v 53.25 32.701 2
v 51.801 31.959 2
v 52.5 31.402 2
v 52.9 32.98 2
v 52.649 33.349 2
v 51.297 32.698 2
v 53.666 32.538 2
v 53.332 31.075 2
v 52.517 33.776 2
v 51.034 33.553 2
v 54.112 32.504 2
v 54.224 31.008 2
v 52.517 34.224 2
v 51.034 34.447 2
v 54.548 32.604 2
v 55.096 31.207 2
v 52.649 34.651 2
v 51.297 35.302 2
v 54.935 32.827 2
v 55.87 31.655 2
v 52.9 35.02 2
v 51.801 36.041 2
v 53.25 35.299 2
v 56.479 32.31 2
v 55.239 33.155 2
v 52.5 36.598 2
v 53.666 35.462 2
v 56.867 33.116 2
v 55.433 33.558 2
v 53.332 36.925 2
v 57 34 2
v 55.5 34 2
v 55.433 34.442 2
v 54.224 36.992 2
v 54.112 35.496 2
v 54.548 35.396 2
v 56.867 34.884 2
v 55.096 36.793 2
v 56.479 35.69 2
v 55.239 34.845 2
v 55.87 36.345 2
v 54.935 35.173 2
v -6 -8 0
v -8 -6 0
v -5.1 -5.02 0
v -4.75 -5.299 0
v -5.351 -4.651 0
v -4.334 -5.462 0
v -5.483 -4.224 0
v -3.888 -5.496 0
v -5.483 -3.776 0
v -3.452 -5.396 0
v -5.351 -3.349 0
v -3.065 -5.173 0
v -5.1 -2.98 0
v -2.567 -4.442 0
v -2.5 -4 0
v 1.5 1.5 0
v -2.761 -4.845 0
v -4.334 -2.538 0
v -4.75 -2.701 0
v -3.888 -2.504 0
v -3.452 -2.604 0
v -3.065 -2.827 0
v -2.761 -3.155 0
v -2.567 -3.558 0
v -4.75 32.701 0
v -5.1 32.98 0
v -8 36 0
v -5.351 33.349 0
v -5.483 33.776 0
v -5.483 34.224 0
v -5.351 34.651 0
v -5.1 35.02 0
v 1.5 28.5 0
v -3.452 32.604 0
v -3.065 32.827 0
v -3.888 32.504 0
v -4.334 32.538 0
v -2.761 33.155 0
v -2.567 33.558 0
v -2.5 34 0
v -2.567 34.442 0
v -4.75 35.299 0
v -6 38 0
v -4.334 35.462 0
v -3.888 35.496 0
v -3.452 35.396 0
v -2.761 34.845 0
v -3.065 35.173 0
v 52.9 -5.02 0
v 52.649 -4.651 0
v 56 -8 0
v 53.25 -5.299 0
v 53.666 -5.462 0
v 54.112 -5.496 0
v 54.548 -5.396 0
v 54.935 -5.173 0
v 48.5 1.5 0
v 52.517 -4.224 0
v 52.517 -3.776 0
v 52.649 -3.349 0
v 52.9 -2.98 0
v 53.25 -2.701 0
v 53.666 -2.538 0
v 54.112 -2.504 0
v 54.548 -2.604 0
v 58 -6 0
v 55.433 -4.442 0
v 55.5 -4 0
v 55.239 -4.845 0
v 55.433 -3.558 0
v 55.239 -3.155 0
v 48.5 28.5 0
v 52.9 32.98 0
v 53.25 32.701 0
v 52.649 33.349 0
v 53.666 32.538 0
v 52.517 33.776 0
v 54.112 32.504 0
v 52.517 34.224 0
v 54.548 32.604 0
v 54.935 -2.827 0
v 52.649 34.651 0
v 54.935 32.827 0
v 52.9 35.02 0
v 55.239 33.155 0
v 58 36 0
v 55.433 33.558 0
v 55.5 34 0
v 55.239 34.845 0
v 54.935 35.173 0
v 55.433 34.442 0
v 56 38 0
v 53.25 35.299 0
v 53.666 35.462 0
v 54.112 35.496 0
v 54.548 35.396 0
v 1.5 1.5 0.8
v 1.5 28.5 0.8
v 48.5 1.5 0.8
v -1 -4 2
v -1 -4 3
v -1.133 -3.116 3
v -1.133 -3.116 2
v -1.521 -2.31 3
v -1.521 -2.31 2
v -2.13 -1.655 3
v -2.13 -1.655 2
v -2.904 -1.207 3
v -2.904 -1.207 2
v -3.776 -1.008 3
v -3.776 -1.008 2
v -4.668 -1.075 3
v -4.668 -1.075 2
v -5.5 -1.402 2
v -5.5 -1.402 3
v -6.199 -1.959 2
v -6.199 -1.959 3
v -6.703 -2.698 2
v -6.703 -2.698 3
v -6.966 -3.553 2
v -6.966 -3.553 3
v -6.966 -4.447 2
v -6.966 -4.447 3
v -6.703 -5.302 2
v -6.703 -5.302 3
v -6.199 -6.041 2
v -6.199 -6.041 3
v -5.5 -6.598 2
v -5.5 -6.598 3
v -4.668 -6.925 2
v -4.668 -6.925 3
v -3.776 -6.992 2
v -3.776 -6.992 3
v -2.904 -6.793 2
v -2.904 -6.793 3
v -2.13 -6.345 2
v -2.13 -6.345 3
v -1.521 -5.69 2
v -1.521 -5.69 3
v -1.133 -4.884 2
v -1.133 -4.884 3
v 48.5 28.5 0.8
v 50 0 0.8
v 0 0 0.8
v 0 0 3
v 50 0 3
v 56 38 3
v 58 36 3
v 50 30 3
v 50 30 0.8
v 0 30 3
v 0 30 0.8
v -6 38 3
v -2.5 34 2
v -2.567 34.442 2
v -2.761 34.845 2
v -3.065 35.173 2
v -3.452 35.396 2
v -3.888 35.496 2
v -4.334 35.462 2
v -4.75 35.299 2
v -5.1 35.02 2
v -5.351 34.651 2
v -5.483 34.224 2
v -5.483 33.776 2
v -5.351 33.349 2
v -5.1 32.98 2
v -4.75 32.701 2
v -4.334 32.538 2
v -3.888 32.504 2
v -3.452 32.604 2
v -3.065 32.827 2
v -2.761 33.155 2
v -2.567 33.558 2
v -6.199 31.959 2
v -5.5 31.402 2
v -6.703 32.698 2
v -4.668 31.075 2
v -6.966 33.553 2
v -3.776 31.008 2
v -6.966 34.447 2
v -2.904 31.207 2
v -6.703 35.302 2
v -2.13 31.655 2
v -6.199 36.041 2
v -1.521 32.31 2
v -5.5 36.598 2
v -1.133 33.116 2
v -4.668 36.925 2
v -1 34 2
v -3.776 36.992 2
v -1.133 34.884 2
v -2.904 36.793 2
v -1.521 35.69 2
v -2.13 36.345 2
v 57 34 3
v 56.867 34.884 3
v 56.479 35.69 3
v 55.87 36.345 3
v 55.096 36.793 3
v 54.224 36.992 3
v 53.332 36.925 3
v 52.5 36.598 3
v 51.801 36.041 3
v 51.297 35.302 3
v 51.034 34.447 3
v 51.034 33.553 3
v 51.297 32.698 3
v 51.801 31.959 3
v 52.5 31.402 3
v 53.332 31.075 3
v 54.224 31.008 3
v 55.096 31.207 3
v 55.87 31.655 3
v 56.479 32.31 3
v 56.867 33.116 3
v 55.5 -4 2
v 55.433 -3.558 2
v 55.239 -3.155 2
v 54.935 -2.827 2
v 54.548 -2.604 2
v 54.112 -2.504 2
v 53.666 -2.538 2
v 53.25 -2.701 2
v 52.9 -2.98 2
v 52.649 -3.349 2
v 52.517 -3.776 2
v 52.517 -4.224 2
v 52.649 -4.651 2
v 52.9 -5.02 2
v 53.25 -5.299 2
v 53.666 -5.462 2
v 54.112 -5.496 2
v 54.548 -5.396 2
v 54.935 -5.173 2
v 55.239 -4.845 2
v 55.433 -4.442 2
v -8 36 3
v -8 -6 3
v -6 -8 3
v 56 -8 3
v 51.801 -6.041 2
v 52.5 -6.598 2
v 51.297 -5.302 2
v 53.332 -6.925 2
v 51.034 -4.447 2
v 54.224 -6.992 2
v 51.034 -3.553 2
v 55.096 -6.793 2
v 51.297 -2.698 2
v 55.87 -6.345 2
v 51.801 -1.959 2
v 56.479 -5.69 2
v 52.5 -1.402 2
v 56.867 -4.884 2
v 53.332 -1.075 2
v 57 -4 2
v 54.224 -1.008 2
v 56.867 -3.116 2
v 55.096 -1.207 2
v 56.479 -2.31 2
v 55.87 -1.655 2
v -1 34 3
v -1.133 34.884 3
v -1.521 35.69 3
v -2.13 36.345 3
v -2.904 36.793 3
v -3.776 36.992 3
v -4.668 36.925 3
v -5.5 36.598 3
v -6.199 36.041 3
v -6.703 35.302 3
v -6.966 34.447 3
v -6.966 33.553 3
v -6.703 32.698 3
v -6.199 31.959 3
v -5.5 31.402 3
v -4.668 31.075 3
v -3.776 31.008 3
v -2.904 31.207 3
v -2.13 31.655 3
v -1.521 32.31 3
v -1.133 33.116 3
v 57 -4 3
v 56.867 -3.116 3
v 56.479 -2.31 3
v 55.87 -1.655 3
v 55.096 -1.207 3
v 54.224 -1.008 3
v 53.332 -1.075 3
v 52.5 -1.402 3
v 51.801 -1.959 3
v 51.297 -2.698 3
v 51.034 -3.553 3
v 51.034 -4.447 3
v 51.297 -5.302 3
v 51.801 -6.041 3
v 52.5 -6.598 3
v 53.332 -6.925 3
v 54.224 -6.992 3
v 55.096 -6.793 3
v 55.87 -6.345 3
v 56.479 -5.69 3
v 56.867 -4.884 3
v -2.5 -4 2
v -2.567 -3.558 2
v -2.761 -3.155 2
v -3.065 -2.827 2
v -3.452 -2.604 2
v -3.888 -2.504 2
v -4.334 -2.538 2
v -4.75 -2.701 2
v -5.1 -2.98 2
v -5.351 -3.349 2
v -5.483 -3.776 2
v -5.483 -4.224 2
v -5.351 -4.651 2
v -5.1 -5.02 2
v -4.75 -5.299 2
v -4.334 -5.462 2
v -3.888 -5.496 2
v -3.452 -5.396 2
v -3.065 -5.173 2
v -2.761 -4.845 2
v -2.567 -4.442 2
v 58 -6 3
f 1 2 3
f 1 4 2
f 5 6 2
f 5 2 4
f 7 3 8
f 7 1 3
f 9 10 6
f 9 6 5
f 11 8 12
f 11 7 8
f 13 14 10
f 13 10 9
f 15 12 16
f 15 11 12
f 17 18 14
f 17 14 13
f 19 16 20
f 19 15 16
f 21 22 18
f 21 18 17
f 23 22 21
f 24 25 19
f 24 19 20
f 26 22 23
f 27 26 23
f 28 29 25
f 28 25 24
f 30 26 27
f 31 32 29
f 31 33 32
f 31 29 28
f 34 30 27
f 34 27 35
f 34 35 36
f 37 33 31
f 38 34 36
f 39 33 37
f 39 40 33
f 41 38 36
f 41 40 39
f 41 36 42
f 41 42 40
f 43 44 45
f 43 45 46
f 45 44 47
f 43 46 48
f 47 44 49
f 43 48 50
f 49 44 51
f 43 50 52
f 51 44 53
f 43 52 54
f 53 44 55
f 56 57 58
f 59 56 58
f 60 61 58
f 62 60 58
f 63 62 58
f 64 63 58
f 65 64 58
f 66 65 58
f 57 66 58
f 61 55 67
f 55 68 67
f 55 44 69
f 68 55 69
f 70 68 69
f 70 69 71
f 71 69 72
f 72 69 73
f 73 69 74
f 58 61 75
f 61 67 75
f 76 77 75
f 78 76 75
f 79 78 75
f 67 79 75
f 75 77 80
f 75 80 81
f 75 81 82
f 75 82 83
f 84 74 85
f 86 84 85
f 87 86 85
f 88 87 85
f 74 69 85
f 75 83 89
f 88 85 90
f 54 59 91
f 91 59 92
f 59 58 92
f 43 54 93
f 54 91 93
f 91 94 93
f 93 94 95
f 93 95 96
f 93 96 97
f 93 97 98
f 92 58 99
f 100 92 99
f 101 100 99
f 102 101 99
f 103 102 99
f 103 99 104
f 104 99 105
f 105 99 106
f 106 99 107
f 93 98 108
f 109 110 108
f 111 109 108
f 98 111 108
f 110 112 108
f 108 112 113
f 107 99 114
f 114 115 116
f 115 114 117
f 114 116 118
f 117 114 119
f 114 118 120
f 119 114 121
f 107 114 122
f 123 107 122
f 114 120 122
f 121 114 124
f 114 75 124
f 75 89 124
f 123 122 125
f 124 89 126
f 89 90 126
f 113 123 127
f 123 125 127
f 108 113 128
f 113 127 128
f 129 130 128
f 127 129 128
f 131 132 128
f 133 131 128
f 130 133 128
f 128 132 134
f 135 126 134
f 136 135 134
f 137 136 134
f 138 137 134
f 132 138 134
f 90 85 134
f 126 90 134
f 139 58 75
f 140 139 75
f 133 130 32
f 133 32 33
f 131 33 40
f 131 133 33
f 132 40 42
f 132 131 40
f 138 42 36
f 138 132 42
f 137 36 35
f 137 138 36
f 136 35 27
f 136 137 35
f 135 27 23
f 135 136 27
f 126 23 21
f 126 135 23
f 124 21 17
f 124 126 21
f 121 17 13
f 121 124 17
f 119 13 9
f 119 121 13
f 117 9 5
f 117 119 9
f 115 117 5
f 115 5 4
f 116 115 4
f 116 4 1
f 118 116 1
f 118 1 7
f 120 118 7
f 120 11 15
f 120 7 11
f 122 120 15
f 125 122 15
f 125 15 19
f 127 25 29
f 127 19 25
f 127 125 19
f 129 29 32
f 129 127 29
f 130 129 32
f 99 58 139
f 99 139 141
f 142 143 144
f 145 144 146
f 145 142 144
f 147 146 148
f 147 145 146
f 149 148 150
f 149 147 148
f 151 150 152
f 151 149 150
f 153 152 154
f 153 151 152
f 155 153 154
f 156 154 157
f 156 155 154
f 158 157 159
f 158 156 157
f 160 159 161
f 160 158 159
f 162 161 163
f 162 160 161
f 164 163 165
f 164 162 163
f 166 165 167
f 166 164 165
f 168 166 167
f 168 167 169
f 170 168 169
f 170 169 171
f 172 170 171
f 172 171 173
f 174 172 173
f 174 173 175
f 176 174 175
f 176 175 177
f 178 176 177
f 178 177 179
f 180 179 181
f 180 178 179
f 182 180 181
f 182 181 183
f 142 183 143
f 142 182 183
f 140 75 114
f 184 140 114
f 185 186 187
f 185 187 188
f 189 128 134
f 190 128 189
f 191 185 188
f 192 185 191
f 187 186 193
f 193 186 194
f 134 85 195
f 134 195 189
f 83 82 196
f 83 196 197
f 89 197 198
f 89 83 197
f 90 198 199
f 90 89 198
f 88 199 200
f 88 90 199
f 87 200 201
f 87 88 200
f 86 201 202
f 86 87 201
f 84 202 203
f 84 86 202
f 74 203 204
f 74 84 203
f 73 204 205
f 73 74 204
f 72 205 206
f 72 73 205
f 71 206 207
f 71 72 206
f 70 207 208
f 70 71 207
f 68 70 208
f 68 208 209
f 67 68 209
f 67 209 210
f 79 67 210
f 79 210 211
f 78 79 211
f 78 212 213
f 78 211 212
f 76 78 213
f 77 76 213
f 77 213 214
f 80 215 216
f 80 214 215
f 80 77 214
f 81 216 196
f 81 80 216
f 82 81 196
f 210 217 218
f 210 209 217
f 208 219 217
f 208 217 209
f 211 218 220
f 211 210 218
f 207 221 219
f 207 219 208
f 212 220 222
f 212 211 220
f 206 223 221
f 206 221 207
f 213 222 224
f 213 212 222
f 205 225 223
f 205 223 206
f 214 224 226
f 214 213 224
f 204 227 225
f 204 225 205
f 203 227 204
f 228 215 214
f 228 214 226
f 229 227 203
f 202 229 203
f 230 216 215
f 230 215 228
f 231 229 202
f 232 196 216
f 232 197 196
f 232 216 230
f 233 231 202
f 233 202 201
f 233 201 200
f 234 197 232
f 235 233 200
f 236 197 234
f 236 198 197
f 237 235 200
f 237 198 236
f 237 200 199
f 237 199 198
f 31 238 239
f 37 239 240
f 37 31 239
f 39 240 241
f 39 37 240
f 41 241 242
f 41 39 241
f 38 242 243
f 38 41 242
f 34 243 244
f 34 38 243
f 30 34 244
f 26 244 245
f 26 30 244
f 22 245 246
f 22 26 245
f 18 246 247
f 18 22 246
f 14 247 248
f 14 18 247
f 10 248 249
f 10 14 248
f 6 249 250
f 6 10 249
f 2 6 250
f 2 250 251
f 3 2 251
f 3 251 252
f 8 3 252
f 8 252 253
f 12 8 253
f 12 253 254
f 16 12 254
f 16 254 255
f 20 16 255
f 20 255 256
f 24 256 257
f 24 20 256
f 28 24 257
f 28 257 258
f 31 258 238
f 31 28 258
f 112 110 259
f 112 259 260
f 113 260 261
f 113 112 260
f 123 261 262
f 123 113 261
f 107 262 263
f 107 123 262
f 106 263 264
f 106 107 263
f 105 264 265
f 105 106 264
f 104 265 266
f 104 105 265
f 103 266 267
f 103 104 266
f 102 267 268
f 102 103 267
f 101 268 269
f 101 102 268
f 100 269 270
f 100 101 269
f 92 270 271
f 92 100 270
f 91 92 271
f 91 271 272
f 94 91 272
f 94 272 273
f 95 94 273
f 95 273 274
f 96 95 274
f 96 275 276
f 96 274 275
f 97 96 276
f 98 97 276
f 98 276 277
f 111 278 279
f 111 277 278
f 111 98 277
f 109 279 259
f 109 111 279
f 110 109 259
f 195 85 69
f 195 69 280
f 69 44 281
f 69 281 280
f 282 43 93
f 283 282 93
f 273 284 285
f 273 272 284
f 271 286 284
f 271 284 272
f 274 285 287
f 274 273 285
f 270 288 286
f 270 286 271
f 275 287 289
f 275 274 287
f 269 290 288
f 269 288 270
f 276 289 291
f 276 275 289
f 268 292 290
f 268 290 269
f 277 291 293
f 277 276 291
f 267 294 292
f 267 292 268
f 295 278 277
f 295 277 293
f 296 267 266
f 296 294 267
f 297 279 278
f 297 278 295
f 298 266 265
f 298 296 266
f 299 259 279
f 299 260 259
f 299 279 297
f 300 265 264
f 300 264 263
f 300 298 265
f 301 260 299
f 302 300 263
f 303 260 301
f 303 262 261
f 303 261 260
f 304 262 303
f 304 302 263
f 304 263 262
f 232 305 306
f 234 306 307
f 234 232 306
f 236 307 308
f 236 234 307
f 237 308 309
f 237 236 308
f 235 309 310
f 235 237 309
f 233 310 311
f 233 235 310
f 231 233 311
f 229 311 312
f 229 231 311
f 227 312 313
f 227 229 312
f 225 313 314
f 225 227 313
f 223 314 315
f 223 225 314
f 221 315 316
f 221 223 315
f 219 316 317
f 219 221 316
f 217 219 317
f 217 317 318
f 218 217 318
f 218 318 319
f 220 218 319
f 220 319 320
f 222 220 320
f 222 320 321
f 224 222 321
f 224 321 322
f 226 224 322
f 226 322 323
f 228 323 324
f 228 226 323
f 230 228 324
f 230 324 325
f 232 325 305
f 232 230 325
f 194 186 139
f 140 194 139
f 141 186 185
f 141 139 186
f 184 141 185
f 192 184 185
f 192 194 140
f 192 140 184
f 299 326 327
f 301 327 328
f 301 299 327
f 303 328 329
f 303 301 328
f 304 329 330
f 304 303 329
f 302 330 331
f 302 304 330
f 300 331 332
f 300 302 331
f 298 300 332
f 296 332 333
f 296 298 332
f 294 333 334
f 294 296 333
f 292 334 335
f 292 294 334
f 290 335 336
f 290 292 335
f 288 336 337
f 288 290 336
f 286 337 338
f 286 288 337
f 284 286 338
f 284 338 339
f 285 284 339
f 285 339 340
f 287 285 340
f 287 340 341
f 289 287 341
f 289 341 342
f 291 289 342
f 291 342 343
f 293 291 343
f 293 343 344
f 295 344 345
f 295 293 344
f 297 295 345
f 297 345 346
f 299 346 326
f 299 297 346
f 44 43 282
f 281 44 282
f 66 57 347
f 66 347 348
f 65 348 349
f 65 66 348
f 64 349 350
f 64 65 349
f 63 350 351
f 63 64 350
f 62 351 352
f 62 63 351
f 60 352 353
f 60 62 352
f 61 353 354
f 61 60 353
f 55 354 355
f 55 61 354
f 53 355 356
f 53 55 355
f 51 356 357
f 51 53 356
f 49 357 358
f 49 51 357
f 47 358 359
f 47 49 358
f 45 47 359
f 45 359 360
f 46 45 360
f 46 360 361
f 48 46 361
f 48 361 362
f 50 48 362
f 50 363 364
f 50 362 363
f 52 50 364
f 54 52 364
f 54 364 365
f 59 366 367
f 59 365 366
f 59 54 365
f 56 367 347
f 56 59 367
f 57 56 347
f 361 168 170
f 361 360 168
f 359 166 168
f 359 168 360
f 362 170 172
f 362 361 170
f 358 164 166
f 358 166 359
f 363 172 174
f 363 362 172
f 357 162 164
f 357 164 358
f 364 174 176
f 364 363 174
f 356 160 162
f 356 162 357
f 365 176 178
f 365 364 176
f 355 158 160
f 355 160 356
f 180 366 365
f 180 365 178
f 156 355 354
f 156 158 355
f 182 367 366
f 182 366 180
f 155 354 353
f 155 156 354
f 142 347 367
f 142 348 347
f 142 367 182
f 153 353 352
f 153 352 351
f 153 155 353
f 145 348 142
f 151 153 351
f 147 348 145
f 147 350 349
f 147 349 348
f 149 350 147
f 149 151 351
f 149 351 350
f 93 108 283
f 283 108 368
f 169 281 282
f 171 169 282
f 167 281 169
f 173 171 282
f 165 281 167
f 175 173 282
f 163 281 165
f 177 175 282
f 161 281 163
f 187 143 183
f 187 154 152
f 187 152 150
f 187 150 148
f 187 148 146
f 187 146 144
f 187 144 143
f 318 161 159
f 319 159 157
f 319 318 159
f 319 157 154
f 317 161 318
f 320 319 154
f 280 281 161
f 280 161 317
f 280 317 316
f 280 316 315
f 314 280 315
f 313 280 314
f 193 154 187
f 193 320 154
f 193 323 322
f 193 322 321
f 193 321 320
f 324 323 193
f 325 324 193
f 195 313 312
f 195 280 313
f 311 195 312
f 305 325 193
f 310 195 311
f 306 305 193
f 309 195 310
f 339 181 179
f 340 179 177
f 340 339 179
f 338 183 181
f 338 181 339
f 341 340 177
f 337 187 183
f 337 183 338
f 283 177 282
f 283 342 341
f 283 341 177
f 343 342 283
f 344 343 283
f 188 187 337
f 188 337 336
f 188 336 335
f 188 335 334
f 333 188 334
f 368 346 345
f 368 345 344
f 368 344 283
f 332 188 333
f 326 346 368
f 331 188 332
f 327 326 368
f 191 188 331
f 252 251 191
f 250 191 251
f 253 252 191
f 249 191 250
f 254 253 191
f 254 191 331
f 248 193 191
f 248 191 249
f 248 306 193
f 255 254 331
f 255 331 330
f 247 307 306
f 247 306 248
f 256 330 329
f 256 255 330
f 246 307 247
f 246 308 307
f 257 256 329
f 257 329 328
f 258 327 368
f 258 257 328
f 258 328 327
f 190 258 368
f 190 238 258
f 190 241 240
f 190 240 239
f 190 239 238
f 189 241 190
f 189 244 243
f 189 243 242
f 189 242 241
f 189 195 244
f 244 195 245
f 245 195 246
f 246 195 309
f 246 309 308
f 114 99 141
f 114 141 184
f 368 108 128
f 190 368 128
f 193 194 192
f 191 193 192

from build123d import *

# Parameters (mm, degrees)
CYLINDER007_R     = 3
CYLINDER007_DEPTH = 3
CYLINDER006_R     = 3
CYLINDER006_DEPTH = 3
CYLINDER004_R     = 3
CYLINDER004_DEPTH = 3
CYLINDER005_R     = 3
CYLINDER005_DEPTH = 3
CYLINDER001_R     = 1.5
CYLINDER001_DEPTH = 10
CYLINDER002_R     = 1.5
CYLINDER002_DEPTH = 10
CYLINDER003_R     = 1.5
CYLINDER003_DEPTH = 10
CYLINDER_R        = 1.5
CYLINDER_DEPTH    = 10
BOX_W             = 50
BOX_H             = 30
BOX_DEPTH         = 3
BOX002_W          = 47
BOX002_H          = 27
BOX002_DEPTH      = 6
BOX001_W          = 66
BOX001_H          = 46
BOX001_DEPTH      = 3
CHAMFER_SIZE      = 2
CHAMFER001_SIZE   = 2


with BuildPart() as v_lec007:
    # Cylinder007 → Cylinder007 (new body)
    with BuildSketch(Plane(origin=(54, -4, -2), x_dir=(1, 0, 0), z_dir=(0, 0, 1))):
        Circle(CYLINDER007_R)
    extrude(amount=CYLINDER007_DEPTH)


with BuildPart() as v_lec006:
    # Cylinder006 → Cylinder006 (new body)
    with BuildSketch(Plane(origin=(54, 34, -2), x_dir=(1, 0, 0), z_dir=(0, 0, 1))):
        Circle(CYLINDER006_R)
    extrude(amount=CYLINDER006_DEPTH)


with BuildPart() as v_lec004:
    # Cylinder004 → Cylinder004 (new body)
    with BuildSketch(Plane(origin=(-4, -4, -2), x_dir=(1, 0, 0), z_dir=(0, 0, 1))):
        Circle(CYLINDER004_R)
    extrude(amount=CYLINDER004_DEPTH)


with BuildPart() as compound001:
    # Cylinder005 → Cylinder005 (new body)
    with BuildSketch(Plane(origin=(-4, 34, -2), x_dir=(1, 0, 0), z_dir=(0, 0, 1))):
        Circle(CYLINDER005_R)
    extrude(amount=CYLINDER005_DEPTH)

    # Compound001: union Válec007, Válec006, Válec004
    add(v_lec007.part)
    add(v_lec006.part)
    add(v_lec004.part)


with BuildPart() as compound001_1:
    # Compound001 placement: moved
    add(compound001.part.moved(Location((0, 0, 4))))


with BuildPart() as v_lec001:
    # Cylinder001 → Cylinder001 (new body)
    with BuildSketch(Plane(origin=(54, -4, -2), x_dir=(1, 0, 0), z_dir=(0, 0, 1))):
        Circle(CYLINDER001_R)
    extrude(amount=CYLINDER001_DEPTH)


with BuildPart() as v_lec002:
    # Cylinder002 → Cylinder002 (new body)
    with BuildSketch(Plane(origin=(54, 34, -2), x_dir=(1, 0, 0), z_dir=(0, 0, 1))):
        Circle(CYLINDER002_R)
    extrude(amount=CYLINDER002_DEPTH)


with BuildPart() as v_lec003:
    # Cylinder003 → Cylinder003 (new body)
    with BuildSketch(Plane(origin=(-4, -4, -2), x_dir=(1, 0, 0), z_dir=(0, 0, 1))):
        Circle(CYLINDER003_R)
    extrude(amount=CYLINDER003_DEPTH)


with BuildPart() as compound:
    # Cylinder → Cylinder (new body)
    with BuildSketch(Plane(origin=(-4, 34, -2), x_dir=(1, 0, 0), z_dir=(0, 0, 1))):
        Circle(CYLINDER_R)
    extrude(amount=CYLINDER_DEPTH)

    # Compound: union Válec001, Válec002, Válec003
    add(v_lec001.part)
    add(v_lec002.part)
    add(v_lec003.part)


with BuildPart() as krychle:
    # Box → Box (new body)
    with BuildSketch(Plane.XY.offset(0.8)):
        with Locations((25, 15)):
            Rectangle(BOX_W, BOX_H)
    extrude(amount=BOX_DEPTH)


with BuildPart() as krychle002:
    # Box002 → Box002 (new body)
    with BuildSketch(Plane(origin=(1.5, 1.5, -1), x_dir=(1, 0, 0), z_dir=(0, 0, 1))):
        with Locations((23.5, 13.5)):
            Rectangle(BOX002_W, BOX002_H)
    extrude(amount=BOX002_DEPTH)


with BuildPart() as f_220_zasuvka_drzho:
    # Box001 → Box001 (new body)
    with BuildSketch(Plane(origin=(-8, -8, 0), x_dir=(1, 0, 0), z_dir=(0, 0, 1))):
        with Locations((33, 23)):
            Rectangle(BOX001_W, BOX001_H)
    extrude(amount=BOX001_DEPTH)

    # Cut: cut Krychle002
    add(krychle002.part, mode=Mode.SUBTRACT)

    # Cut001: cut Krychle
    add(krychle.part, mode=Mode.SUBTRACT)

    # Cut002: cut Compound
    add(compound.part, mode=Mode.SUBTRACT)

    # Cut003: cut Compound001
    add(compound001_1.part, mode=Mode.SUBTRACT)

    # Chamfer
    chamfer_edges = [f_220_zasuvka_drzho.edges().sort_by_distance(p)[0] for p in [
        (-8, -8, 1.5),
        (58, -8, 1.5),
    ]]
    chamfer(chamfer_edges, length=CHAMFER_SIZE)

    # Chamfer001
    chamfer001_edges = [f_220_zasuvka_drzho.edges().sort_by_distance(p)[0] for p in [
        (-8, 38, 1.5),
        (58, 38, 1.5),
    ]]
    chamfer(chamfer001_edges, length=CHAMFER001_SIZE)


solid = f_220_zasuvka_drzho.part
